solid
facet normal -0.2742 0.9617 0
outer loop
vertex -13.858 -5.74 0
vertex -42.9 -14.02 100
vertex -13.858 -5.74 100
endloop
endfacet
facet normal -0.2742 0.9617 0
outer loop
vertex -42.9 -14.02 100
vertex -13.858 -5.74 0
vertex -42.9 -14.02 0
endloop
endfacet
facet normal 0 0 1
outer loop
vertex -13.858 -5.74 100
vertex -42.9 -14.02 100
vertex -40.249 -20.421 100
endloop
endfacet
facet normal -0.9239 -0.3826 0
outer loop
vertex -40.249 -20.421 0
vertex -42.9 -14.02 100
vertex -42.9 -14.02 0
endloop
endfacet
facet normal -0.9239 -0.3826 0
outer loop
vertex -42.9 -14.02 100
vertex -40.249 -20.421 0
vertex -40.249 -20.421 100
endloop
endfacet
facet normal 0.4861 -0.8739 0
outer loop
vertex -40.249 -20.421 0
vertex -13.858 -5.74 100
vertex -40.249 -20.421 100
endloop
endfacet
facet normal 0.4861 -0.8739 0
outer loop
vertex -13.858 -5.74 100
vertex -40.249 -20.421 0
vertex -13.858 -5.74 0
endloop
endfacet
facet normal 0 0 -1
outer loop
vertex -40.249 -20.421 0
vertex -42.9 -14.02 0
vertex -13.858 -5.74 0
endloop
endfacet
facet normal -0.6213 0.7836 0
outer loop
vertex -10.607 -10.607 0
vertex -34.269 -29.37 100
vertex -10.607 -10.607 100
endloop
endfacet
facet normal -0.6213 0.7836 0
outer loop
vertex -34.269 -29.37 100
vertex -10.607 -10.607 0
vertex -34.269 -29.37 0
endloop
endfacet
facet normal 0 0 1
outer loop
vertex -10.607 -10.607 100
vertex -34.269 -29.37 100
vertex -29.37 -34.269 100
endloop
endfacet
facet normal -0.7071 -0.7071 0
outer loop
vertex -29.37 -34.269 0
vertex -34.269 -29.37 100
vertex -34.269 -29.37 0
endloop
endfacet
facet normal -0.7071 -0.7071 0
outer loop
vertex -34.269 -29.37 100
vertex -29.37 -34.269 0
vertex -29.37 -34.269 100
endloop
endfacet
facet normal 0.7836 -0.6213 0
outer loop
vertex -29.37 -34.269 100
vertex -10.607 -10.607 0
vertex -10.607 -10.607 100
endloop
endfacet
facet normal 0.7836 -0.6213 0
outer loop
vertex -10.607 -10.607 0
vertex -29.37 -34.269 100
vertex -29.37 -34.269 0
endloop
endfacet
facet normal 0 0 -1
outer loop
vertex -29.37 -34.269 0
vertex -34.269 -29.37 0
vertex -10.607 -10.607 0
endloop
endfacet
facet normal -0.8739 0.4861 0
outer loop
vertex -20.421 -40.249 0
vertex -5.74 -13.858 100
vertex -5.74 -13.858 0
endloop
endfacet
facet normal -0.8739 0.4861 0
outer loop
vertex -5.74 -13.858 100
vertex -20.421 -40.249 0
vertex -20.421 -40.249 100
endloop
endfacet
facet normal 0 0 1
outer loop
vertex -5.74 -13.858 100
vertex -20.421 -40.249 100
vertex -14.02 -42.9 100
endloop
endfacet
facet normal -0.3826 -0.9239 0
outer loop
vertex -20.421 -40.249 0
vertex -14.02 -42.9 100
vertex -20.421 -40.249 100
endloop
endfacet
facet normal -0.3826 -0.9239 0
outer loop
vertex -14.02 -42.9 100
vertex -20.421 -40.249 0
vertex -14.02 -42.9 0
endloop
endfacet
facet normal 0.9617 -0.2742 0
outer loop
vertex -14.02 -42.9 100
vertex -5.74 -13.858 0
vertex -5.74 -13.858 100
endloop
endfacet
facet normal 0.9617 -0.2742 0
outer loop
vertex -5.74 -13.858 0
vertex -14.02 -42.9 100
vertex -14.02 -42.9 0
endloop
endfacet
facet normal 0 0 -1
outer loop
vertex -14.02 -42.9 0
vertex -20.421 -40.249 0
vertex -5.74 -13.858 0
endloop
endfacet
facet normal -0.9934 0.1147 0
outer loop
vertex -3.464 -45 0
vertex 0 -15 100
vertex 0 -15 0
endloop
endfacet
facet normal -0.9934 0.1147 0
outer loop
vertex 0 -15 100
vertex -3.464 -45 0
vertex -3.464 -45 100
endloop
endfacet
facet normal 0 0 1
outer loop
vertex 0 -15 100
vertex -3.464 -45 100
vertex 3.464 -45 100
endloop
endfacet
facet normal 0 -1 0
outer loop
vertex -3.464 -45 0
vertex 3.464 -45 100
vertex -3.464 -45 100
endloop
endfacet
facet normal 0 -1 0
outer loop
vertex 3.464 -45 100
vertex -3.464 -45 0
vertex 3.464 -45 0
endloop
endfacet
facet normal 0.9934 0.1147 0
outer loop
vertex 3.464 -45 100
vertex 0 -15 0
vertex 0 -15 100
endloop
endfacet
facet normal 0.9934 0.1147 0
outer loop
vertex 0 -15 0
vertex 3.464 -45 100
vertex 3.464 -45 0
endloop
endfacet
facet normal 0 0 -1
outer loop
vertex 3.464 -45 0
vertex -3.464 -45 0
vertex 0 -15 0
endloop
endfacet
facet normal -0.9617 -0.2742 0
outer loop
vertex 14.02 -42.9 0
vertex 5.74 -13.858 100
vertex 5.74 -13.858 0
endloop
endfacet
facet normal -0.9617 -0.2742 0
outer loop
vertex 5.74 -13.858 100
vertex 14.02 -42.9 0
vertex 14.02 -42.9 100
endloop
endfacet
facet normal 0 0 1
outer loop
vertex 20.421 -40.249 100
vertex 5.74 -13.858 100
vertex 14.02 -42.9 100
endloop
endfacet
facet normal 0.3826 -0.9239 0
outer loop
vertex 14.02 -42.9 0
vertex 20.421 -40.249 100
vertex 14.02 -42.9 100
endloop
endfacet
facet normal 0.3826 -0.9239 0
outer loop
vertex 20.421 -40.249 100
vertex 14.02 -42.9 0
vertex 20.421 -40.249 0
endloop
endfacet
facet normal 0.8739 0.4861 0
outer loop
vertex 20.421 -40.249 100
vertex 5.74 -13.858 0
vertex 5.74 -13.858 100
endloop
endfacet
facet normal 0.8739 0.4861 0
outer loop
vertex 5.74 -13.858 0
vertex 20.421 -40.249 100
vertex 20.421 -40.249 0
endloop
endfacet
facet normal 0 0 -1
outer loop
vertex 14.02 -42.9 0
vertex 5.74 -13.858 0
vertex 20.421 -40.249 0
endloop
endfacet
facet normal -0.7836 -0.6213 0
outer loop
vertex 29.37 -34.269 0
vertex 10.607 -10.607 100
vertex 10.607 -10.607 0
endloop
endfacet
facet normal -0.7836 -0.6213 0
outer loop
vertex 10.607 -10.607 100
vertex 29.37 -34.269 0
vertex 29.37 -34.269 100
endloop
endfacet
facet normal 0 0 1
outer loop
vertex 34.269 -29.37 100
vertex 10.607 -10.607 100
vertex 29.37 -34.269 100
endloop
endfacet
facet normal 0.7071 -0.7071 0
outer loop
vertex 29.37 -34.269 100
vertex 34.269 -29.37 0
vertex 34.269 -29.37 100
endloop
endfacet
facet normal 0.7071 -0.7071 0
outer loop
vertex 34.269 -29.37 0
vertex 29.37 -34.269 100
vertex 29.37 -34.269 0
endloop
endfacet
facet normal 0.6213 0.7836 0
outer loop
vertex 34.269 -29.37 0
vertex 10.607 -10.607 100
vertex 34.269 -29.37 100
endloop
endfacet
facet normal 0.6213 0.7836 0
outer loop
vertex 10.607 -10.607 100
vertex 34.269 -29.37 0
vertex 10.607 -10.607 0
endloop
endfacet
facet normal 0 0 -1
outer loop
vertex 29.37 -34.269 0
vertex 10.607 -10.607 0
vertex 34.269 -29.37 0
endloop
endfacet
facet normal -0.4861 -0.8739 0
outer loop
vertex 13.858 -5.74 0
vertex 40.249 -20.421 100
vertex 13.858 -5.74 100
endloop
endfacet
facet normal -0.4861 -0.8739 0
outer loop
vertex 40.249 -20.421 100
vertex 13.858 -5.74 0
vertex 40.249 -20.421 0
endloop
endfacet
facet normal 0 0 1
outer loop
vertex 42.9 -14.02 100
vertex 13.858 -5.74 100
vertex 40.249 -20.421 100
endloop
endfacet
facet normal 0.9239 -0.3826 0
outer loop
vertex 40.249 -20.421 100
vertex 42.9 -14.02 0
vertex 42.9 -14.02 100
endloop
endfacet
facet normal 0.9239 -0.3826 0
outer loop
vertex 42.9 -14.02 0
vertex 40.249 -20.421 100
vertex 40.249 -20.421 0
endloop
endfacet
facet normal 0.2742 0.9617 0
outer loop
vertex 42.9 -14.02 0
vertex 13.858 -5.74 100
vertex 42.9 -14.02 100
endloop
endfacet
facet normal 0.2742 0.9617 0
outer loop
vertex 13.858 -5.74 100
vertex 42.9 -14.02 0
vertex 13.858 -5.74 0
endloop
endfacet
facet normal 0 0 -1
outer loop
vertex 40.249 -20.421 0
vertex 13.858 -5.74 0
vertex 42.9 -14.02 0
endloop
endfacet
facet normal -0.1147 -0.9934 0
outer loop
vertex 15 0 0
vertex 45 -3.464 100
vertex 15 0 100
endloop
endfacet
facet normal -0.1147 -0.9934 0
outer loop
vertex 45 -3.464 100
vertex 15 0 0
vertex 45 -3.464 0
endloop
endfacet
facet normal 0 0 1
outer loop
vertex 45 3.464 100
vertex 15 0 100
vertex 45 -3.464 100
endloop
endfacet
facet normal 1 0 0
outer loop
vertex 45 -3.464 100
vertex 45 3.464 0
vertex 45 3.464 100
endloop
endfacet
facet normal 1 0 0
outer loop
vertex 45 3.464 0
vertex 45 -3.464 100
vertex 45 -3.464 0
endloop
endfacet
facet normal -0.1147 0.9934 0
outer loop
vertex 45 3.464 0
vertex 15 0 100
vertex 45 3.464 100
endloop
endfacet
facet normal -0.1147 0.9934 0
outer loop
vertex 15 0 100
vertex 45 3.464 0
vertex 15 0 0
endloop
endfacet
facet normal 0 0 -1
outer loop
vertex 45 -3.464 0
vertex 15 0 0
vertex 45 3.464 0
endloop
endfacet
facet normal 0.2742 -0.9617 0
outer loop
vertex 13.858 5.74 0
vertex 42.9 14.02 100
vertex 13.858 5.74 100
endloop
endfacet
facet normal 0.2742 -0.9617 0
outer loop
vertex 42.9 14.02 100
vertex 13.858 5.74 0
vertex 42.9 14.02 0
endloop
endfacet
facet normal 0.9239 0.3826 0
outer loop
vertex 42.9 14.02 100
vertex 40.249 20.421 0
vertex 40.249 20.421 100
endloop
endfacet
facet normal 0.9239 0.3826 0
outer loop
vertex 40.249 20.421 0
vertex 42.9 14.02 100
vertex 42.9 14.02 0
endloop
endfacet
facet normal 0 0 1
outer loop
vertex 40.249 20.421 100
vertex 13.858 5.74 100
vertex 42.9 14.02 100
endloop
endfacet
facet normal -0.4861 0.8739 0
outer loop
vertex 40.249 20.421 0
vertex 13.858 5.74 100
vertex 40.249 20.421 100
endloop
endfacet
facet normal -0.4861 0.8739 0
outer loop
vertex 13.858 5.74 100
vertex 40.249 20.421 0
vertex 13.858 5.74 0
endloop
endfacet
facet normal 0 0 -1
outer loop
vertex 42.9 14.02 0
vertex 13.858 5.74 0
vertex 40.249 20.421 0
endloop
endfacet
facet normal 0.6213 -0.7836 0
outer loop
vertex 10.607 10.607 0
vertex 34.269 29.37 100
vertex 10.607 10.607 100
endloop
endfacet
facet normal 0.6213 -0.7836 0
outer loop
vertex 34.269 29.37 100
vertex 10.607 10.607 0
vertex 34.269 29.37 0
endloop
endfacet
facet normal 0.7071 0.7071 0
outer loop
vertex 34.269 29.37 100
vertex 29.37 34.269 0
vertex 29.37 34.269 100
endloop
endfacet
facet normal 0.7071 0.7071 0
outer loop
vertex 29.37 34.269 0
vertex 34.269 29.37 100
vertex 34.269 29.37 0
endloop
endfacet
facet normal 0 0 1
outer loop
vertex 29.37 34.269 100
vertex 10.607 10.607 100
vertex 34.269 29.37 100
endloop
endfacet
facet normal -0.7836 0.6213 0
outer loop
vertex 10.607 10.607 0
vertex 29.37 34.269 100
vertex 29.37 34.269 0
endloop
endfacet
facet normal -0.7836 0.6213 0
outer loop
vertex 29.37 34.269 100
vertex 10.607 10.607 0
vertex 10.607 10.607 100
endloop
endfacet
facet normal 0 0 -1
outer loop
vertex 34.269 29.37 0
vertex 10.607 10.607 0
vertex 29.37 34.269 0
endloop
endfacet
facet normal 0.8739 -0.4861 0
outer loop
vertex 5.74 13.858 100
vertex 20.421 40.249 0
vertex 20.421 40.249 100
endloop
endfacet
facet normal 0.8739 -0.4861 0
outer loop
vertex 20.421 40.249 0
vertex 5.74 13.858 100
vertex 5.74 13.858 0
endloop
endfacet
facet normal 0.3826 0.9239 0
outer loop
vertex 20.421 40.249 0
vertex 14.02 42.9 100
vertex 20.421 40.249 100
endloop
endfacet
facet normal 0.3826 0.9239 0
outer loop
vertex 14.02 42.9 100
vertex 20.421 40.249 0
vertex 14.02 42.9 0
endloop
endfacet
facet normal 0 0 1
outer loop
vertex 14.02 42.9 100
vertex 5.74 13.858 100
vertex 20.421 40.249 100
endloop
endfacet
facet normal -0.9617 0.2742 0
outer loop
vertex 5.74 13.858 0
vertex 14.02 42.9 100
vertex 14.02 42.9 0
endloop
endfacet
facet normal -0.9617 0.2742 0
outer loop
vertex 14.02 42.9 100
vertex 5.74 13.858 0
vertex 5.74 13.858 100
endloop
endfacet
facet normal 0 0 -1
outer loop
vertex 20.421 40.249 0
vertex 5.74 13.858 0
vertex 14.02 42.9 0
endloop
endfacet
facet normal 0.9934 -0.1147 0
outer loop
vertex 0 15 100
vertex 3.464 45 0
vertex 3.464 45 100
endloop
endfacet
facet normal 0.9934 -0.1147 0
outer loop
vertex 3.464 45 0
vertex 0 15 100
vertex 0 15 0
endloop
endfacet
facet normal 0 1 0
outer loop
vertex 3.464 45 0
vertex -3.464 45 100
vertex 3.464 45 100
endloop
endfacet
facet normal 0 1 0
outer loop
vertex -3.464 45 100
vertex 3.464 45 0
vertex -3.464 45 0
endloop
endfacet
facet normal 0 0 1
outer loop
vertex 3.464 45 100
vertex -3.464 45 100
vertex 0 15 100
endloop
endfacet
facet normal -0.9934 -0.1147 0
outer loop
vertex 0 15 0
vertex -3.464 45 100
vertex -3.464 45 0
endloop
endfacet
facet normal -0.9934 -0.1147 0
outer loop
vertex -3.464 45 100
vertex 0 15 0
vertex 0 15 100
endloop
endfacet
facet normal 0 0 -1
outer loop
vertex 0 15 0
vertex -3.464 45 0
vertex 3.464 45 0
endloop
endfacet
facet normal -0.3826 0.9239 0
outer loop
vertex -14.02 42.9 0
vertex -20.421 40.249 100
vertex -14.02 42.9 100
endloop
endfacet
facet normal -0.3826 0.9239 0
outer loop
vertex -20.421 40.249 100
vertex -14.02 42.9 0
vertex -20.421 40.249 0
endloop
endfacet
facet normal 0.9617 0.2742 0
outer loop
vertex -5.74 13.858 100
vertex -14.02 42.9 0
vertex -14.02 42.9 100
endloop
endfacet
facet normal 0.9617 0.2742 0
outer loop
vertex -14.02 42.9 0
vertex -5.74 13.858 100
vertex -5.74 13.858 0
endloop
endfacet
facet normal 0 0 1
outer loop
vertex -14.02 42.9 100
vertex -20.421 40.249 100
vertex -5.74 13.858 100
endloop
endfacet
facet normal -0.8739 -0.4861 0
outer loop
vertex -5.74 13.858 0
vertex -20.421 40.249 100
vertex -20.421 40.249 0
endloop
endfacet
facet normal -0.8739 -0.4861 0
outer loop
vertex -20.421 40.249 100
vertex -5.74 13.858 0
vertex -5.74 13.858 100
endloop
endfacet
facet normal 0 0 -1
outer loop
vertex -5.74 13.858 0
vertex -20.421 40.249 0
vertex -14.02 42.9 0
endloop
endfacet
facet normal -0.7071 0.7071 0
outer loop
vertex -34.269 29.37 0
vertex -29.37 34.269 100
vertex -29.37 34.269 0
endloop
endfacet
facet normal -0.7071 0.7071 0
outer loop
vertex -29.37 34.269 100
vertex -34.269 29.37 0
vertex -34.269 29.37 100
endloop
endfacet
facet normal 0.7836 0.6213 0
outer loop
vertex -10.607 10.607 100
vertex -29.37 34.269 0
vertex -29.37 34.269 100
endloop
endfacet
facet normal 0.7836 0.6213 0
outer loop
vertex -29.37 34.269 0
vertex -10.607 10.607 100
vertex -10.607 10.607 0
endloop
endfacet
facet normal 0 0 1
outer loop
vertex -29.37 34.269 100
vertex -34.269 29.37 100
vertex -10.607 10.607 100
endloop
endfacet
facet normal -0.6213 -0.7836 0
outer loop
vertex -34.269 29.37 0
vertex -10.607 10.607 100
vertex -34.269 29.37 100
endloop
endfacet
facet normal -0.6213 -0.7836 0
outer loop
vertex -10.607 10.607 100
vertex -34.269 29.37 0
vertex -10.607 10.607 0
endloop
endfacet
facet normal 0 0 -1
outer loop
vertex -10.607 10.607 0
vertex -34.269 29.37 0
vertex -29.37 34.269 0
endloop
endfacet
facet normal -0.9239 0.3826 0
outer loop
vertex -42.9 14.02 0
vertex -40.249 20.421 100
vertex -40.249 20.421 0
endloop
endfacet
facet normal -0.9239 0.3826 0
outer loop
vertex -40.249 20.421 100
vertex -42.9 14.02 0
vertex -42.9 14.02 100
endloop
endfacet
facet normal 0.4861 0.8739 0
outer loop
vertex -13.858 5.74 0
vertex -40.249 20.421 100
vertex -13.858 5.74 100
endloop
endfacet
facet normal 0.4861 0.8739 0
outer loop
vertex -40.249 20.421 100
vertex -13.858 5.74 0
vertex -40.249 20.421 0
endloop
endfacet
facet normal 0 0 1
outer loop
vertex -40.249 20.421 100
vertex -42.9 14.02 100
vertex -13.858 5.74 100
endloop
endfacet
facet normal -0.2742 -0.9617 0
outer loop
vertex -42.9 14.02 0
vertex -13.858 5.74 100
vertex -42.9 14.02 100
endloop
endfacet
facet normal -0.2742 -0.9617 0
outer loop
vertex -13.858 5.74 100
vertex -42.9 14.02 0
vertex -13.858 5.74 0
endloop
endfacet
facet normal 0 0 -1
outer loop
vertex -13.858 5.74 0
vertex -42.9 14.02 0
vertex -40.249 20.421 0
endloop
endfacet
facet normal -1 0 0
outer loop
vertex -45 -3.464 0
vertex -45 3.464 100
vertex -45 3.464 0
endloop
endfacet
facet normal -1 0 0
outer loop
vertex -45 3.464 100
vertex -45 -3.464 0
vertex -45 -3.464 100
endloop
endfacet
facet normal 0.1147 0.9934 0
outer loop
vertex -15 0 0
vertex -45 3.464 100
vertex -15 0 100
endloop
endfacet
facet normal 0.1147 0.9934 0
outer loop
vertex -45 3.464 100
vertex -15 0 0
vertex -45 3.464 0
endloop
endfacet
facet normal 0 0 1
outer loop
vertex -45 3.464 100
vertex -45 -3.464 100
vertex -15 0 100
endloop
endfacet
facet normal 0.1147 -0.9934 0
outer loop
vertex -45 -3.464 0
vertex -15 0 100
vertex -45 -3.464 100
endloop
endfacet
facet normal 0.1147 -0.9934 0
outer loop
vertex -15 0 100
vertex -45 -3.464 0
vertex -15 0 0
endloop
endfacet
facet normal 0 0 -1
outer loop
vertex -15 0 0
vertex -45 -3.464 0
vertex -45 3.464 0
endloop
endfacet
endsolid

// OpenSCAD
diametreInterieurTrous=30;
diametreExterieurTrous=70;
hauteurTrous=100;
nbTrous=16;

module trous () {
for (i =[1:nbTrous])
    rotate(a=360/nbTrous*i,v=[0,0,1])
        scale([1,.2,1]) 
            translate([-diametreExterieurTrous/2,0,0]) 
                cylinder(h=hauteurTrous,r=(diametreExterieurTrous-diametreInterieurTrous)/2,$fn=3);
}

trous();
